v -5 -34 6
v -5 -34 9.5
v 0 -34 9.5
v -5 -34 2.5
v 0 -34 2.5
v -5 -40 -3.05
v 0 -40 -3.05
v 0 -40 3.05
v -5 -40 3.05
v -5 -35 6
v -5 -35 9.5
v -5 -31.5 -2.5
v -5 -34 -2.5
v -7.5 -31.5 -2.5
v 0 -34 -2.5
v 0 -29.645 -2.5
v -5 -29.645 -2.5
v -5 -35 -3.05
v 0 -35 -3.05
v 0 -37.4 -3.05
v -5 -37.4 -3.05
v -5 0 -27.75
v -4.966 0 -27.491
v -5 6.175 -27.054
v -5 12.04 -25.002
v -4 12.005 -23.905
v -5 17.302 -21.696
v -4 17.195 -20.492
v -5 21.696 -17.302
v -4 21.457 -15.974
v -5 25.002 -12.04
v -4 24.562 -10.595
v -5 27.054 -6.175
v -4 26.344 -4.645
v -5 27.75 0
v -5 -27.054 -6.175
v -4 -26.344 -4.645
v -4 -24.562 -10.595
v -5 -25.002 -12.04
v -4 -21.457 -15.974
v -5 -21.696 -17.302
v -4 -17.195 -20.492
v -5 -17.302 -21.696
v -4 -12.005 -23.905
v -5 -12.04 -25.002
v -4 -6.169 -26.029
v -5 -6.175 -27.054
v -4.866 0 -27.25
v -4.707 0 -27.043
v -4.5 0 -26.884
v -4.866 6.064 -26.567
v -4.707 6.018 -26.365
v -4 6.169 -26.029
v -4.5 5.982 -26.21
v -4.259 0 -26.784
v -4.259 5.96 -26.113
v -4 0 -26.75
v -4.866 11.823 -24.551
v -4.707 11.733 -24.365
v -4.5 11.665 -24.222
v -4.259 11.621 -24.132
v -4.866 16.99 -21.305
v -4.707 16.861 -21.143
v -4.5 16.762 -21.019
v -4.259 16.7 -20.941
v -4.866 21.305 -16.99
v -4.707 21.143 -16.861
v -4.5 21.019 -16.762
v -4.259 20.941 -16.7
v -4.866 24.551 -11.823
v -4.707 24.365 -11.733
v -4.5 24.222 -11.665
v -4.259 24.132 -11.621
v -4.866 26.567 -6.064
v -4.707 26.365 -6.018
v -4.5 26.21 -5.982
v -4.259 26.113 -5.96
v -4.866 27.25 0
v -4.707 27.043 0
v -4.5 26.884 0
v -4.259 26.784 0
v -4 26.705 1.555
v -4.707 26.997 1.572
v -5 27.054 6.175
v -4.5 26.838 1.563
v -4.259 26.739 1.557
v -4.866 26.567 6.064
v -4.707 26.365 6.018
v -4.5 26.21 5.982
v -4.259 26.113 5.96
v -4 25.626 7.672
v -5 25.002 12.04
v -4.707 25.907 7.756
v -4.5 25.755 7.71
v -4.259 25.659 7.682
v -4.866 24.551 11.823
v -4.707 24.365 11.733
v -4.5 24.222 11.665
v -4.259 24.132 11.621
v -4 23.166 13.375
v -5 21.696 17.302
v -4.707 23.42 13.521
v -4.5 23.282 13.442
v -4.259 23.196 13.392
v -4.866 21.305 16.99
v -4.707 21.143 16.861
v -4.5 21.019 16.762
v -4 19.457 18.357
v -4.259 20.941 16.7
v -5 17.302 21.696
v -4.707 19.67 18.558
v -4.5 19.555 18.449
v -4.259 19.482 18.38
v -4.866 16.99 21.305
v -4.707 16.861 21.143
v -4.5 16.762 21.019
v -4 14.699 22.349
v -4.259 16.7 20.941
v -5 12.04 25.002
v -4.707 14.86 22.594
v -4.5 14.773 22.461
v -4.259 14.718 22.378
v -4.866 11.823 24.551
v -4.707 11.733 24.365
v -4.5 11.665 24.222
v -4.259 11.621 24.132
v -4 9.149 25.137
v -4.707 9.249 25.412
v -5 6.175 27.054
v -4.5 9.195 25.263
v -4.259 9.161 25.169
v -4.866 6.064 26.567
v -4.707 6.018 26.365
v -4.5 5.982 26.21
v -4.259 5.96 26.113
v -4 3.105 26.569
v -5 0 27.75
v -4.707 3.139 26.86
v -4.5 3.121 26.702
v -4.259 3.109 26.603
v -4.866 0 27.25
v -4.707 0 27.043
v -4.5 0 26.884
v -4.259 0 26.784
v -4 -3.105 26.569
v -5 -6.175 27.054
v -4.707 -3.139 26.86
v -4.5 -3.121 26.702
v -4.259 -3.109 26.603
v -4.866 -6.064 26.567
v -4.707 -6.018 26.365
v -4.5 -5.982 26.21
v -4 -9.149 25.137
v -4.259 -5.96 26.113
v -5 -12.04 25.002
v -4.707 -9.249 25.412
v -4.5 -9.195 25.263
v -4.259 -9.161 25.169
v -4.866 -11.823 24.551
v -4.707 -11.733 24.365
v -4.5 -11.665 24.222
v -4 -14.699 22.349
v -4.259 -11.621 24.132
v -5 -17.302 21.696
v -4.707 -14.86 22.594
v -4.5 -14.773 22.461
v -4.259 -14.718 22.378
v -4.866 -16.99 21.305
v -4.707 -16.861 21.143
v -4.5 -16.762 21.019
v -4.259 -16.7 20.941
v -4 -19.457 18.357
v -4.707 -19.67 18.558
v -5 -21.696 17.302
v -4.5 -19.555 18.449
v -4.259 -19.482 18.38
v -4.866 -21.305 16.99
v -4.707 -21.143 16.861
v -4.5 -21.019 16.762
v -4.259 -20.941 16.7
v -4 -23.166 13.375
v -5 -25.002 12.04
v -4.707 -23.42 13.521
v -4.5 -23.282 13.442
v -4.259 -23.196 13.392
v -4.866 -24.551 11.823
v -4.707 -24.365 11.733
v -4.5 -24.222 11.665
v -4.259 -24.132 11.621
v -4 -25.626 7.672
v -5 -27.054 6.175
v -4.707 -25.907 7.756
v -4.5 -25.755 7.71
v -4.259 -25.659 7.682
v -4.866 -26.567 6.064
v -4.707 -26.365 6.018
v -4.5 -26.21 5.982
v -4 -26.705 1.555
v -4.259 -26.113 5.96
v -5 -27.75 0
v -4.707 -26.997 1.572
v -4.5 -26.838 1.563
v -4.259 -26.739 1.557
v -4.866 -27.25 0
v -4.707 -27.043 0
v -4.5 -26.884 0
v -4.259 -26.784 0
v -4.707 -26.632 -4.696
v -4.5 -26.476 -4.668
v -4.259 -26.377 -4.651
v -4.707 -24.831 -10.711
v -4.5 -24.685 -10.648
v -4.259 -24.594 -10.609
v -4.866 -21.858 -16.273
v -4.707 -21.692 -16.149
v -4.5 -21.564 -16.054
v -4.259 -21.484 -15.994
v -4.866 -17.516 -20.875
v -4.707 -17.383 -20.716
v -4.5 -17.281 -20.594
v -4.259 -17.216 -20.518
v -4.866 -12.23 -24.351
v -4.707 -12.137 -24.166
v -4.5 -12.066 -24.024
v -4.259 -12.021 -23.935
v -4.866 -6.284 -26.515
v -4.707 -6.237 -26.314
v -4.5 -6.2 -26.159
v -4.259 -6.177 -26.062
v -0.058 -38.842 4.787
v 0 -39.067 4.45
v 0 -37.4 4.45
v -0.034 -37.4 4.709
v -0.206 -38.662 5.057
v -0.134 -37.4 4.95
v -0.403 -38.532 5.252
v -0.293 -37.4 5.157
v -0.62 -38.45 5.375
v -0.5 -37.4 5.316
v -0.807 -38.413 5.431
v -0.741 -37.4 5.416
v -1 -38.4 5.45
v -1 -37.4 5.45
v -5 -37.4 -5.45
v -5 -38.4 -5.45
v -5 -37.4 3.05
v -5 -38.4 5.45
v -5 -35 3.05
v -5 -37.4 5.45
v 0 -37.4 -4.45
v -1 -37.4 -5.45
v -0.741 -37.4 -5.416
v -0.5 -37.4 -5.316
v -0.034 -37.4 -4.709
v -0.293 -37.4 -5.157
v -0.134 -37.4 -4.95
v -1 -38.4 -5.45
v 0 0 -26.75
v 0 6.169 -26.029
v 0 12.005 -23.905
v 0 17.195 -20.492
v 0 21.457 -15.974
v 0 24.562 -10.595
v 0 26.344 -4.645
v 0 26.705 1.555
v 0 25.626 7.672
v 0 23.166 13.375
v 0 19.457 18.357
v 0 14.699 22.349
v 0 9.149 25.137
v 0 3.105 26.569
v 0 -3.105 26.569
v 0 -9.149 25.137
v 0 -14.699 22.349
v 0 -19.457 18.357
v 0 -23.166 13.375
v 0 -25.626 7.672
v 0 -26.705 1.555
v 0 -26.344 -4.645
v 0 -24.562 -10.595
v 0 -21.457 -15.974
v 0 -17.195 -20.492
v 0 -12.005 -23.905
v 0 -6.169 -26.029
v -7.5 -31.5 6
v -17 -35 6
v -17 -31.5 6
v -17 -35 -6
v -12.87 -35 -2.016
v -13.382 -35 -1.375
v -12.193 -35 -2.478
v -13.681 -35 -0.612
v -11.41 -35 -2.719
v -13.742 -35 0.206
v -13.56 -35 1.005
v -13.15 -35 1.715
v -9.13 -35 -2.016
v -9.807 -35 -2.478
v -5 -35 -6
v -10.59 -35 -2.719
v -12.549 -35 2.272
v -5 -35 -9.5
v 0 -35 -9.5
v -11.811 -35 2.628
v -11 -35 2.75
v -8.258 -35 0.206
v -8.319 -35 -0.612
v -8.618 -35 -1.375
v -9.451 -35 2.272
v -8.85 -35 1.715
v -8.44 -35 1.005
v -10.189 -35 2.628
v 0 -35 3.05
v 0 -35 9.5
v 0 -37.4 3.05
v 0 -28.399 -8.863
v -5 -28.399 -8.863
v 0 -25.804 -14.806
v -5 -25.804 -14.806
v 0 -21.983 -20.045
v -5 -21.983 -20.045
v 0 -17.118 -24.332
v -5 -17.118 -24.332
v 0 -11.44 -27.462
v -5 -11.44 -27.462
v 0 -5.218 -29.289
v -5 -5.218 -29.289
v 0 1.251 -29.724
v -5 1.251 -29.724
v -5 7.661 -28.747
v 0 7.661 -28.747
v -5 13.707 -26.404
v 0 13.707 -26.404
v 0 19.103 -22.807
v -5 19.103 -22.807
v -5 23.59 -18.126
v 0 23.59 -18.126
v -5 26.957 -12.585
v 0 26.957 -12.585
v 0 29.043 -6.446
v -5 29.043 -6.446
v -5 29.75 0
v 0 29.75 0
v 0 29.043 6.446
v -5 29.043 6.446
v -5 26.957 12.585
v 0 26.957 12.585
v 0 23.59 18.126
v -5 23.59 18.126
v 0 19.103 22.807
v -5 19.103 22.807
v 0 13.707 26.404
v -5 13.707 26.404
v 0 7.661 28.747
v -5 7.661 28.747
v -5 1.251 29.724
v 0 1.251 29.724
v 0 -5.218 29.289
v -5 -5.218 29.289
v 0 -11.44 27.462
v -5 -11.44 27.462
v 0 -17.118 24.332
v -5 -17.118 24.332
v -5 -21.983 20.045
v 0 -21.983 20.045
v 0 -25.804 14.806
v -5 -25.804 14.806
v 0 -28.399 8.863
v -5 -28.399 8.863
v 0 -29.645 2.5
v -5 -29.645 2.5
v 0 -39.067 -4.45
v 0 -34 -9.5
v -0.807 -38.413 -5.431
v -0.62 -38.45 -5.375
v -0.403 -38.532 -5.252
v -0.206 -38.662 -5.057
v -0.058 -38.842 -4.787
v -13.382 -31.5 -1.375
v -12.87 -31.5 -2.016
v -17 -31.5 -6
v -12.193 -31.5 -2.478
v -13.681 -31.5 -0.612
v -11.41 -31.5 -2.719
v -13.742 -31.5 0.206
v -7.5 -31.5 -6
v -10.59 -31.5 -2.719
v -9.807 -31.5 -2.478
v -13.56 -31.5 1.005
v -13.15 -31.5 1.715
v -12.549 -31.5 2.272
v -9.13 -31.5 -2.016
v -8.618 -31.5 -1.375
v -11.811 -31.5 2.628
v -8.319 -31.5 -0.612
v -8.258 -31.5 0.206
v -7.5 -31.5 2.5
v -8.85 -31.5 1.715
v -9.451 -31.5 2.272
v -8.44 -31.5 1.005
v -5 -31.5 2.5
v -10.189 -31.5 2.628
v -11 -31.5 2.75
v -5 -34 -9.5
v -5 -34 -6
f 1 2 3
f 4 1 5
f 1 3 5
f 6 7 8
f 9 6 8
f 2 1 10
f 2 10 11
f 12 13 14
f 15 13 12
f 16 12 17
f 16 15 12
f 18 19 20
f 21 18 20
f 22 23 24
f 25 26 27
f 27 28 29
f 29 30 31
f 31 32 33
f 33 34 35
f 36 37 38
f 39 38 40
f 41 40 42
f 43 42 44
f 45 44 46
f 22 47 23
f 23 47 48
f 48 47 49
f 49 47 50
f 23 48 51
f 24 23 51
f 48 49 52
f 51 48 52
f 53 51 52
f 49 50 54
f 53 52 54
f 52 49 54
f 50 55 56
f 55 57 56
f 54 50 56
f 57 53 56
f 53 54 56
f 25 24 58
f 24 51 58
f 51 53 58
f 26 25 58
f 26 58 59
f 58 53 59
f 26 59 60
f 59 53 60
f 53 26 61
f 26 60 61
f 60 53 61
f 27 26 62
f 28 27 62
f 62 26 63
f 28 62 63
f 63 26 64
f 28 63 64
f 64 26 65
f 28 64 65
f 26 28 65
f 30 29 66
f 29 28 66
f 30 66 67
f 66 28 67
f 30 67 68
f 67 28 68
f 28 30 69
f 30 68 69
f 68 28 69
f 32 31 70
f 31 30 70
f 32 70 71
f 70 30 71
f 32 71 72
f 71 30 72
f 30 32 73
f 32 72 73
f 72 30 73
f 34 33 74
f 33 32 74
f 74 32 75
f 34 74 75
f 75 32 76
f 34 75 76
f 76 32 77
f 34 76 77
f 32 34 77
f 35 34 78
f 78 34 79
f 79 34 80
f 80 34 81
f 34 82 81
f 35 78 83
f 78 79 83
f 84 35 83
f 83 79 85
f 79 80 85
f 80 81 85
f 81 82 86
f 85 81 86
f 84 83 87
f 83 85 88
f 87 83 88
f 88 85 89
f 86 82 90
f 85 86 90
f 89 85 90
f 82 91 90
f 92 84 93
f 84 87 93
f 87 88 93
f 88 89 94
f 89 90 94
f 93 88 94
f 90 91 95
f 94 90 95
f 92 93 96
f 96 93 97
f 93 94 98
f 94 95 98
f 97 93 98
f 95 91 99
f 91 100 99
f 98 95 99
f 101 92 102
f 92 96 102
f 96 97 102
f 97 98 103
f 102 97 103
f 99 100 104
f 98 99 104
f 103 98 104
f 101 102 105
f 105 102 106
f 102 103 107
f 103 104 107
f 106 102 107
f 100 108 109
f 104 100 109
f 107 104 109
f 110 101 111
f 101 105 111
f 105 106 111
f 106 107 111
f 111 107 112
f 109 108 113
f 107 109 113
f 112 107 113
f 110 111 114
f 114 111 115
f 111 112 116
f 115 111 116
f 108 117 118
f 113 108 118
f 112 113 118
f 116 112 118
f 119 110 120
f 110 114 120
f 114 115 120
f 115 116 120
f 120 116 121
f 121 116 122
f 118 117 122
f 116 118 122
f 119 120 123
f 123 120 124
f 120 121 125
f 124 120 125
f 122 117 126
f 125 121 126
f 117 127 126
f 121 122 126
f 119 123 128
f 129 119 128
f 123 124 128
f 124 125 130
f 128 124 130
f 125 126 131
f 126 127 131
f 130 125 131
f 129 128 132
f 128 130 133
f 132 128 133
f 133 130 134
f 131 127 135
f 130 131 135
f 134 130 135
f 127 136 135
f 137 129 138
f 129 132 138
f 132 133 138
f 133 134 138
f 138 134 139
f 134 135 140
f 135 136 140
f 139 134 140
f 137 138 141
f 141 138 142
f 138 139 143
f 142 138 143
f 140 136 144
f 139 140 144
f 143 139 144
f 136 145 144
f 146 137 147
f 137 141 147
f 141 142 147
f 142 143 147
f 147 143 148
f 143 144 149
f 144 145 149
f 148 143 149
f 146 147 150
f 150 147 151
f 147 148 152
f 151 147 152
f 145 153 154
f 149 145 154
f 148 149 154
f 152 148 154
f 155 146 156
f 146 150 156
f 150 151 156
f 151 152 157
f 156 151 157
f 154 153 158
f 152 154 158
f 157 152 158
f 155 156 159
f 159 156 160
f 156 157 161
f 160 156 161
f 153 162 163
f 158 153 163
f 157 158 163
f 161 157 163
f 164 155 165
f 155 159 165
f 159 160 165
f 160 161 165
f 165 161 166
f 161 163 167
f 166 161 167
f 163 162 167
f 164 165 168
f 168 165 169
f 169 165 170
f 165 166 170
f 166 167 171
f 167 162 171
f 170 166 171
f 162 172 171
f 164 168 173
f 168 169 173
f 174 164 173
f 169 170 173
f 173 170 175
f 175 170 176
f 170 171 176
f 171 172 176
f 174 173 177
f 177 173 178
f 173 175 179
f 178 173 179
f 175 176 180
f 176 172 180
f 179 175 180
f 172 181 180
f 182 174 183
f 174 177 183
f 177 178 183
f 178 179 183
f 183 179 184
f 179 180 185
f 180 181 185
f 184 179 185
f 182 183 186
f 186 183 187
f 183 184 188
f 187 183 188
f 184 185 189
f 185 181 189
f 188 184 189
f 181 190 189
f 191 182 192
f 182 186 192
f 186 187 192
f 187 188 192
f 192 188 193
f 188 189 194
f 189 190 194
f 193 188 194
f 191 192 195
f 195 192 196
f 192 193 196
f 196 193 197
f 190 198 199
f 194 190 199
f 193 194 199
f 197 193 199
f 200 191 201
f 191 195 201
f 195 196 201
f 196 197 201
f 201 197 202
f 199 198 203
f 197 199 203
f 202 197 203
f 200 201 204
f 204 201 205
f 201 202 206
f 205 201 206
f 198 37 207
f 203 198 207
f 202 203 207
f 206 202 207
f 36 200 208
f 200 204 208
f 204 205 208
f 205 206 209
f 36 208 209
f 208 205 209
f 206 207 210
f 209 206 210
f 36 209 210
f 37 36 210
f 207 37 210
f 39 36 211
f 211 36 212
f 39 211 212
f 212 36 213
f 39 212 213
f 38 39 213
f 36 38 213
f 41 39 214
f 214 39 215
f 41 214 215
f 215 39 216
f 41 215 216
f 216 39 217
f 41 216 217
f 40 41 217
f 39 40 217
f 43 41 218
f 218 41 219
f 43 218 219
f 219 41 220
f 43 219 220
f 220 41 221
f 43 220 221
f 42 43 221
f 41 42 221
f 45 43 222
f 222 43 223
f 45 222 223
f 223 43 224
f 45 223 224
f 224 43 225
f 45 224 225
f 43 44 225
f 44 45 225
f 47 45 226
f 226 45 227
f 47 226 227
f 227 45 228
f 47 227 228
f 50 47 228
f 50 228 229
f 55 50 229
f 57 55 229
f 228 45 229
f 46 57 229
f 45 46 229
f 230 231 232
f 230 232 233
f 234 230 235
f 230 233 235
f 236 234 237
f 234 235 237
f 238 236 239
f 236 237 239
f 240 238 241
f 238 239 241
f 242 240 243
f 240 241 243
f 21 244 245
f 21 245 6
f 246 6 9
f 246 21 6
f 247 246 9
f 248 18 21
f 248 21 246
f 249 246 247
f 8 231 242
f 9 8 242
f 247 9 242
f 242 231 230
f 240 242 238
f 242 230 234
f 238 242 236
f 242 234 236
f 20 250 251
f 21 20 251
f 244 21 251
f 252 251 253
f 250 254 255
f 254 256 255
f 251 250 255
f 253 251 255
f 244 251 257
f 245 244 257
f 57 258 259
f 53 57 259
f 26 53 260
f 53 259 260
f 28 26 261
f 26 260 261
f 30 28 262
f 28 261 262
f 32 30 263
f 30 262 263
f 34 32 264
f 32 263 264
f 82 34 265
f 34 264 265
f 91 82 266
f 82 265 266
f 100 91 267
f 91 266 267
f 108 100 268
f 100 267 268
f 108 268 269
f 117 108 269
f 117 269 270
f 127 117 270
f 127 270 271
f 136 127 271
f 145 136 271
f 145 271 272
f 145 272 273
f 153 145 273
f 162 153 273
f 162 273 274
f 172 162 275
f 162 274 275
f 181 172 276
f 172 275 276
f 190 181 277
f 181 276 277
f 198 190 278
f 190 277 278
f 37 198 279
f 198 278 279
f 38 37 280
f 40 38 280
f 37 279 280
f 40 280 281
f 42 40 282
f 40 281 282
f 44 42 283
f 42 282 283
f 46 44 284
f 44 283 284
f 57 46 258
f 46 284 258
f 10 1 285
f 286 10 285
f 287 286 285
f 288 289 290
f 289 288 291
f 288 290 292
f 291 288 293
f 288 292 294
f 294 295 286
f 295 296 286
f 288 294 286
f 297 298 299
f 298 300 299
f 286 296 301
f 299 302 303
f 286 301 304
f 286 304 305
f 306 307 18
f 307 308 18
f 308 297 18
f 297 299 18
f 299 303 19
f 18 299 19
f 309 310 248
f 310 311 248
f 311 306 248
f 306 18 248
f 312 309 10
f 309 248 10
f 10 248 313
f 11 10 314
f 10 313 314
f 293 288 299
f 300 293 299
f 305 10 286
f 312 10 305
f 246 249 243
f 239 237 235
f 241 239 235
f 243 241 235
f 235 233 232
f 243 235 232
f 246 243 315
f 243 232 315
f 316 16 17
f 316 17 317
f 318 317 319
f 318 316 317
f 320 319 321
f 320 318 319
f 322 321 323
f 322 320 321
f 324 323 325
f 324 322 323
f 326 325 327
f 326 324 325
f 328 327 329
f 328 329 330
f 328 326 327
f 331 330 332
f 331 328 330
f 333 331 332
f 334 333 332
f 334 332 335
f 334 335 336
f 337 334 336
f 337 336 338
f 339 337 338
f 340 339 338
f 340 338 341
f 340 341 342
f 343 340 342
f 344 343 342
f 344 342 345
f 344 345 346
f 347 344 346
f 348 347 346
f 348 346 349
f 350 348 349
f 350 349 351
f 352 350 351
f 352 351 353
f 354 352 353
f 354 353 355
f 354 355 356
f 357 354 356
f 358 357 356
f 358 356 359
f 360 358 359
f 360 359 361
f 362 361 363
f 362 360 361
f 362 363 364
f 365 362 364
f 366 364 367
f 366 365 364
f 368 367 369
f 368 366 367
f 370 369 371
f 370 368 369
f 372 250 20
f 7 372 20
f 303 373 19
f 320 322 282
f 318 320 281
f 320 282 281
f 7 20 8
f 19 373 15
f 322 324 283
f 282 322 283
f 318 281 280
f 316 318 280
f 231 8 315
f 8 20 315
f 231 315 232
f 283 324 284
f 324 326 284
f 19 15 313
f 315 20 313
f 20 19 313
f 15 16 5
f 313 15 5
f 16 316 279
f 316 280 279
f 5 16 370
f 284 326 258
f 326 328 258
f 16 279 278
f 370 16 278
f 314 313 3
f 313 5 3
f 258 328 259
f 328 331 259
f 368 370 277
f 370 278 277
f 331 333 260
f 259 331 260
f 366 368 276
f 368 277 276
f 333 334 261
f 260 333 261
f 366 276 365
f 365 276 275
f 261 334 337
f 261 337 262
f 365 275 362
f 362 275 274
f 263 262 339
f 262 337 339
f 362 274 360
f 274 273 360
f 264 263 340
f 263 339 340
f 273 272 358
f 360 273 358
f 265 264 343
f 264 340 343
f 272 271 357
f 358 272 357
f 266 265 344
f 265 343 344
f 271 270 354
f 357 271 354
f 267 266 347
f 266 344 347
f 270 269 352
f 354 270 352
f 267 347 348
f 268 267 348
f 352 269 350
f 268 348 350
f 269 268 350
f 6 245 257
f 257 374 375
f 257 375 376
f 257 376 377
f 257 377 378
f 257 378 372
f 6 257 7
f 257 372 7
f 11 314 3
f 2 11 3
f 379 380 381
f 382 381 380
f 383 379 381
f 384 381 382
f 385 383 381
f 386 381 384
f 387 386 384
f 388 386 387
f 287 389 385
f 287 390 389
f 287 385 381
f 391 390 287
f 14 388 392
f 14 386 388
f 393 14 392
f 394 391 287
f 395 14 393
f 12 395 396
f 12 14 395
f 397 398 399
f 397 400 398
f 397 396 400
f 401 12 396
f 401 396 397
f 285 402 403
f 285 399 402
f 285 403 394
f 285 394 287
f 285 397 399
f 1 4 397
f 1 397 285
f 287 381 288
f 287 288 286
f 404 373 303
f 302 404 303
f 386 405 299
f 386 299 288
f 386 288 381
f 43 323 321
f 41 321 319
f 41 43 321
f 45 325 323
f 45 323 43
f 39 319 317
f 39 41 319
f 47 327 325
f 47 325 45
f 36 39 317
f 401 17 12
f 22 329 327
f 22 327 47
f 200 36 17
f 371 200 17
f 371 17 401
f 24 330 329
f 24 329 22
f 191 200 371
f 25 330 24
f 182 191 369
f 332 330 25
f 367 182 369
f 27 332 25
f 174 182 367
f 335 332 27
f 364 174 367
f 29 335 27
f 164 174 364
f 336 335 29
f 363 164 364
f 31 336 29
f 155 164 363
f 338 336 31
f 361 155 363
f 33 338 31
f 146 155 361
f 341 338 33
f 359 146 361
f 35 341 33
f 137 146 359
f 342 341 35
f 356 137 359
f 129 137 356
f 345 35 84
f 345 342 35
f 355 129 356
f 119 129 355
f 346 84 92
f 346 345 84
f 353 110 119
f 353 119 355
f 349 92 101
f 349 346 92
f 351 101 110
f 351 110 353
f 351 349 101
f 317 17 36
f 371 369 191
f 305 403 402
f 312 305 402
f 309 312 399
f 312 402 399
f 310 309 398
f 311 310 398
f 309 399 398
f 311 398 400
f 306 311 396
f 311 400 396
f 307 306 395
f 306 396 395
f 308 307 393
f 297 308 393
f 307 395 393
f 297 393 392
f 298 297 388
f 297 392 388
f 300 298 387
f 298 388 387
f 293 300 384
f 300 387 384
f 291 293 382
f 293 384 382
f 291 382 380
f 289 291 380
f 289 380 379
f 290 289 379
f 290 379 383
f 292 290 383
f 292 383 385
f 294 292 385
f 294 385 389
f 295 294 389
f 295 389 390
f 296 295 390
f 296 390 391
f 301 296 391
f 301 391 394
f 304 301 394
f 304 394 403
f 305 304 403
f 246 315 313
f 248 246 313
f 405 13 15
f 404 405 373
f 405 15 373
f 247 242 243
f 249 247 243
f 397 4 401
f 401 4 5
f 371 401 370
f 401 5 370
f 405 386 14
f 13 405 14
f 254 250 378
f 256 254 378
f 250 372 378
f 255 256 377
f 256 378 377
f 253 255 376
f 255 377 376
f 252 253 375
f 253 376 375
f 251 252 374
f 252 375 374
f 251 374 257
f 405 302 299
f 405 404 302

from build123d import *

# Parameters (mm, degrees)
SKETCH1_R            = 29.75
SKETCH1_R_2          = 26.75
BOSS_EXTRUDE1_DEPTH  = 5
SKETCH2_W            = 5
SKETCH2_H            = 5.355228117
BOSS_EXTRUDE2_DEPTH  = 5
BOSS_EXTRUDE3_DEPTH  = 5
FILLET1_R            = 1
SKETCH38_W           = 12
SKETCH38_H           = 3.5
BOSS_EXTRUDE28_DEPTH = 12
CUT_EXTRUDE3_REACH   = 72.183
SKETCH39_R           = 2.75
CHAMFER1_SIZE        = 2.5
FILLET3_R            = 1


with BuildPart() as part:
    # Sketch1 → Boss-Extrude1 (new body)
    with BuildSketch(Plane(origin=(0, 0, 0), x_dir=(0, 0, -1), z_dir=(1, 0, 0))):
        Circle(SKETCH1_R)
        Circle(SKETCH1_R_2, mode=Mode.SUBTRACT)
    extrude(amount=-BOSS_EXTRUDE1_DEPTH)

    # Sketch2 → Boss-Extrude2 (add)
    with BuildSketch(Plane(origin=(0, 0, 0), x_dir=(0, 0, -1), z_dir=(1, 0, 0))):
        with Locations((0, -32.322385942)):
            Rectangle(SKETCH2_W, SKETCH2_H)
    extrude(amount=-BOSS_EXTRUDE2_DEPTH)

    # Sketch3 → Boss-Extrude3 (add)
    with BuildSketch(Plane(origin=(0, 0, 0), x_dir=(0, 0, -1), z_dir=(1, 0, 0))):
        Polygon((-9.5, -35), (-9.5, -34), (9.5, -34), (9.5, -35), (3.05, -35), (3.05, -37.4), (5.45, -37.4), (5.45, -38.4), (3.05, -40), (-3.05, -40), (-5.45, -38.4), (-5.45, -37.4), (-3.05, -37.4), (-3.05, -35), align=None)
    extrude(amount=-BOSS_EXTRUDE3_DEPTH)

    # Fillet1
    fillet1_edges = [part.edges().sort_by_distance(p)[0] for p in [
        (0, -37.9, 5.45),
        (0, -37.9, -5.45),
    ]]
    fillet(fillet1_edges, radius=FILLET1_R)

    # Sketch38 → Boss-Extrude28 (add)
    with BuildSketch(Plane.ZY.offset(5)):
        with Locations((0, -33.25)):
            Rectangle(SKETCH38_W, SKETCH38_H)
    extrude(amount=BOSS_EXTRUDE28_DEPTH)

    # Sketch39 → Cut-Extrude3 (cut, up to next)
    with BuildSketch(Plane(origin=(0, -31.5, 0), x_dir=(1, 0, 0), z_dir=(0, 1, 0)), mode=Mode.PRIVATE) as cut_extrude3_sk1:
        with Locations(Location((-11, 0, 0), (0, 0, 270))):
            Circle(SKETCH39_R)
    cut_extrude3_tool1 = extrude(cut_extrude3_sk1.sketch, amount=-CUT_EXTRUDE3_REACH, mode=Mode.PRIVATE) & part.part
    add(cut_extrude3_tool1.solids().sort_by_distance((-11, -31.5, 0))[0], mode=Mode.SUBTRACT)

    # Chamfer1
    chamfer1_edges = [part.edges().sort_by_distance(p)[0] for p in [
        (-5, -31.5, 4.25),
        (-5, -31.5, -4.25),
    ]]
    chamfer(chamfer1_edges, length=CHAMFER1_SIZE - 0.0001)  # a hair under: the kernel refuses the full size

    # Fillet3
    fillet3_edges = [part.edges().sort_by_distance(p)[0] for p in [
        (-5, 0, 26.75),
    ]]
    fillet(fillet3_edges, radius=FILLET3_R)


solid = part.part
